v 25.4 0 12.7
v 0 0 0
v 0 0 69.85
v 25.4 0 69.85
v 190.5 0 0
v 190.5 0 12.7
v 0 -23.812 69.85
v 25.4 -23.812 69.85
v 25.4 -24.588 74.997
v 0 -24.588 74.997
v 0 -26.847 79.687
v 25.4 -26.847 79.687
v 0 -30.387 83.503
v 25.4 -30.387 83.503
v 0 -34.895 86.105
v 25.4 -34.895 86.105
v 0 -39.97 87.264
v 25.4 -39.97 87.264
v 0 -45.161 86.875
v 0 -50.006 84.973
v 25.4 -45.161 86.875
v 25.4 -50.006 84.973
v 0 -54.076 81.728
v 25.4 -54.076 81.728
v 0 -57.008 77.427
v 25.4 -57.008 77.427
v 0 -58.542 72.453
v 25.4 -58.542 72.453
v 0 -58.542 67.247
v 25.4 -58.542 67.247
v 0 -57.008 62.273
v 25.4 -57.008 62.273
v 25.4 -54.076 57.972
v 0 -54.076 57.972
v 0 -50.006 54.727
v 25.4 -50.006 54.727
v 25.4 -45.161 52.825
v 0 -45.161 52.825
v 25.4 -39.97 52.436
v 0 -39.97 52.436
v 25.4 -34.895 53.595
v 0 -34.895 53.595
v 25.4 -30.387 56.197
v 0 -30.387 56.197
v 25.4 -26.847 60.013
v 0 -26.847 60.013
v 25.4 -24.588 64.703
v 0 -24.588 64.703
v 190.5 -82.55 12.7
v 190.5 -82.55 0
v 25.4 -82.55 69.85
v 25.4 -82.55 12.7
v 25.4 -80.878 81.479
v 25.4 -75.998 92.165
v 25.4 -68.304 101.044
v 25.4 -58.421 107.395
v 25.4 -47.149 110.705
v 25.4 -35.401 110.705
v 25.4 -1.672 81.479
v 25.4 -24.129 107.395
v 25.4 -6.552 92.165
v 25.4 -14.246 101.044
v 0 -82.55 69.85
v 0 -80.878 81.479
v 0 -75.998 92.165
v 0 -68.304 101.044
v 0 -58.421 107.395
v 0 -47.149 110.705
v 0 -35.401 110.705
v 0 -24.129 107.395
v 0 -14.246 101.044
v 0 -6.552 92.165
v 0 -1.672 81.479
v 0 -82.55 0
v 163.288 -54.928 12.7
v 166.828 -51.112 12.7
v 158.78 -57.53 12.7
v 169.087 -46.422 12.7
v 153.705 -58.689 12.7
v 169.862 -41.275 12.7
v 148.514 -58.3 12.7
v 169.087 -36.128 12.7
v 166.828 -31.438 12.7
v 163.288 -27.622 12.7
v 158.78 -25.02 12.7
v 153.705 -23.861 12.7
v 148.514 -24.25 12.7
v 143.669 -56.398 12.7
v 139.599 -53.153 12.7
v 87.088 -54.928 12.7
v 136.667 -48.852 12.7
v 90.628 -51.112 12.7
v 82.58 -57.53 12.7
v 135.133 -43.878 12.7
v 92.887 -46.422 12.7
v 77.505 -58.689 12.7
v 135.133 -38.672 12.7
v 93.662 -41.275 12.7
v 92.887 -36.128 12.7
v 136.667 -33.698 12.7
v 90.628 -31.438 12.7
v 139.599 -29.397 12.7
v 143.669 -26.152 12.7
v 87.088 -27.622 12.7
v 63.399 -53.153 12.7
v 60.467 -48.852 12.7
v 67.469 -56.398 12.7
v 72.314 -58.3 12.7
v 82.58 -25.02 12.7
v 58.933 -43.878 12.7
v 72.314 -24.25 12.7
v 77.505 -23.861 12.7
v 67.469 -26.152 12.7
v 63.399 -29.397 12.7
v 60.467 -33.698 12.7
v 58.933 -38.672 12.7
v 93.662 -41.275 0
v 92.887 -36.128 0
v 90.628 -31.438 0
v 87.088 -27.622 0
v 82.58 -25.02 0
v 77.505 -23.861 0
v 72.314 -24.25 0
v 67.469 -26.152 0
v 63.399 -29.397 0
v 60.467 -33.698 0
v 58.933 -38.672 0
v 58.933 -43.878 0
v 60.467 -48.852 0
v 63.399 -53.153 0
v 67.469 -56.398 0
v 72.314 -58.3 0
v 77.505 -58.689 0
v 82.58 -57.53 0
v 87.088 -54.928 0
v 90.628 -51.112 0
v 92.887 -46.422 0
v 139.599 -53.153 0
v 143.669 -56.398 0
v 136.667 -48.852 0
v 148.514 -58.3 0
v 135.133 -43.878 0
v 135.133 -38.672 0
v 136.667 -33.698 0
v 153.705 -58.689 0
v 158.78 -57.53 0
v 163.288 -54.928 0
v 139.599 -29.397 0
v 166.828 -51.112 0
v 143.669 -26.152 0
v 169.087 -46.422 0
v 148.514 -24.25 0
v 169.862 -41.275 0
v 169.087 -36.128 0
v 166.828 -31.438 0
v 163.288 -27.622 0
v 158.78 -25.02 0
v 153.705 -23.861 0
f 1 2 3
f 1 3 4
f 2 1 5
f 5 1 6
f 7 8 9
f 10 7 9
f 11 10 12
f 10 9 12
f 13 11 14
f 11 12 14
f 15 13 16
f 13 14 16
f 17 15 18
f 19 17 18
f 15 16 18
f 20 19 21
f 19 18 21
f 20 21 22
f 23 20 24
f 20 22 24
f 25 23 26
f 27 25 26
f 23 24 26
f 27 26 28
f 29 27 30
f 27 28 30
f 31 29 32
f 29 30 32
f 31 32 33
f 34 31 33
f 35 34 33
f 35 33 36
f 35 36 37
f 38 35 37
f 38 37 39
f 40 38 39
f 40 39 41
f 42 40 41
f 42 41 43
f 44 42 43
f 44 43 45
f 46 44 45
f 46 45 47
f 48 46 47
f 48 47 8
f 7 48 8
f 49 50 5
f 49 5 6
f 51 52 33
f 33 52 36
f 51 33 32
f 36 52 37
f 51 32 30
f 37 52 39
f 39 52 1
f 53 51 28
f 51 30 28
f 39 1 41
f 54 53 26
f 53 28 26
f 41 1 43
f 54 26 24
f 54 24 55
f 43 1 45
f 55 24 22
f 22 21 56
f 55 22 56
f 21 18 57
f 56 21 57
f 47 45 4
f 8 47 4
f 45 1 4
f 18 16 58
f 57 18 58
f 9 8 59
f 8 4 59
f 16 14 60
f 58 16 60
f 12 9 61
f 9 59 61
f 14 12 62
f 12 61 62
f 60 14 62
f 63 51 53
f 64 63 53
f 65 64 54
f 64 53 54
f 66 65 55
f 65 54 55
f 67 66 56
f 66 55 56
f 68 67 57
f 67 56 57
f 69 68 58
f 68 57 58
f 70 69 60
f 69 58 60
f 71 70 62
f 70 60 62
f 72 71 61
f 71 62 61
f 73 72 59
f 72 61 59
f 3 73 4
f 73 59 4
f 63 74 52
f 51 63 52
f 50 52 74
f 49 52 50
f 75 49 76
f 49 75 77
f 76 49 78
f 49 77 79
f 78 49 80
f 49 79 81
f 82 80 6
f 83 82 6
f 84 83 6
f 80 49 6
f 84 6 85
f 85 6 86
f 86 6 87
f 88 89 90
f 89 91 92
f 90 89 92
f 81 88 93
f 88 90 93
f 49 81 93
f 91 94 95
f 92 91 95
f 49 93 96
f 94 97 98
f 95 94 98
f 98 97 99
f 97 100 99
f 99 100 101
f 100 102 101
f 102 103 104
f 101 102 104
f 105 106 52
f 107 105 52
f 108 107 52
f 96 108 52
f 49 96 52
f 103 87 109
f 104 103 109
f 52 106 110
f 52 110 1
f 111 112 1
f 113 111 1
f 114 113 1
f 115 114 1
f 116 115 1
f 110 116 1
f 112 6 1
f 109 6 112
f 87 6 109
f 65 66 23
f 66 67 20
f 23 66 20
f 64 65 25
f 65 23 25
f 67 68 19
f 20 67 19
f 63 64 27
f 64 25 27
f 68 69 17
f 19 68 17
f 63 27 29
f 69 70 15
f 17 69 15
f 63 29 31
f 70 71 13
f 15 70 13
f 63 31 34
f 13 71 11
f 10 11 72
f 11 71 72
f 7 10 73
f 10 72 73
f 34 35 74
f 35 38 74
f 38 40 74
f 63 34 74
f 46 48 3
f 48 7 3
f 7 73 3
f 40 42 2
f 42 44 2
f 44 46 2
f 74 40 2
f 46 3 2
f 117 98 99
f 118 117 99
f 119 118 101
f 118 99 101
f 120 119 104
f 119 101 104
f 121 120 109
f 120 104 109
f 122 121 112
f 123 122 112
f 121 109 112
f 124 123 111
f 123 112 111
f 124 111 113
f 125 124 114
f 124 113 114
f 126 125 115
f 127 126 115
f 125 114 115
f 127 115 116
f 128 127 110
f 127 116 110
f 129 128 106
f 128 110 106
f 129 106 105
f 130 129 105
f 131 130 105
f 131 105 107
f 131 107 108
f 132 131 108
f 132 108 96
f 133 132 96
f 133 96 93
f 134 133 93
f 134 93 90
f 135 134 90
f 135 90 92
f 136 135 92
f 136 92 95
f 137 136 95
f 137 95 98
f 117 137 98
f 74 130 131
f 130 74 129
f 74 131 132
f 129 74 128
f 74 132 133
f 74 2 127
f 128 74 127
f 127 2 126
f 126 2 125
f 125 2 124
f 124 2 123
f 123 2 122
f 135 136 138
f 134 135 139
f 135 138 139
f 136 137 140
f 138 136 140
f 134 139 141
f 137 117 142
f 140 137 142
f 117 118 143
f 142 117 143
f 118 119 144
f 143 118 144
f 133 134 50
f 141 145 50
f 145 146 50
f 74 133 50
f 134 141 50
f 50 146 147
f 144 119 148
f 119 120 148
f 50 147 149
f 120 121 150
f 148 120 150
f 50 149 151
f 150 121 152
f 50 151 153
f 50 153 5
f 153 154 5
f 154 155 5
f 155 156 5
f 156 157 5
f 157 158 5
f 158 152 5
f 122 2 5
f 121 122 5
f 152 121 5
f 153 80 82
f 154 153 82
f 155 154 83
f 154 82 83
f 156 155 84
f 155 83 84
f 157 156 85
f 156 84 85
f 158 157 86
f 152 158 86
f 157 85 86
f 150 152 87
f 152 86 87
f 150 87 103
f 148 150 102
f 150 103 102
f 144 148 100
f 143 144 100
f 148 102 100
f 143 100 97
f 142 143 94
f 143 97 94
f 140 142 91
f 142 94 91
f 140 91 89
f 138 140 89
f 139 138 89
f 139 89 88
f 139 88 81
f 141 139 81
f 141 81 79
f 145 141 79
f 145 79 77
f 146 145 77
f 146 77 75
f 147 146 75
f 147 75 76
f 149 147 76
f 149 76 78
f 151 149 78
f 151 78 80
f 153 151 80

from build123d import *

# Parameters (mm, degrees)
F1_DEPTH = 82.55
F2_R     = 17.4625
F3_DEPTH = 25.401
F4_R     = 17.4625
F5_DEPTH = 12.701


with BuildPart() as f1:
    # F0 (on Front) → F1 (new body)
    with BuildSketch(Plane.XZ):
        Polygon((0, 127), (0, 0), (190.5, 0), (190.5, 12.7), (25.4, 12.7), (25.4, 127), align=None)
    extrude(amount=F1_DEPTH)

    # F2 (on face) → F3 (cut, through all)
    with BuildSketch(Plane.YZ.offset(25.4)):
        with Locations((-41.275, 69.85)):
            Circle(F2_R)
        with BuildLine():
            ThreePointArc((-82.55, 69.85), (-41.275, 111.125), (0, 69.85))
            Line((0, 69.85), (0, 127))
            Line((0, 127), (-82.55, 127))
            Line((-82.55, 127), (-82.55, 69.85))
        make_face()
    extrude(amount=-F3_DEPTH, mode=Mode.SUBTRACT)

    # F4 (on face) → F5 (cut, through all)
    with BuildSketch(Plane.XY.offset(12.7)):
        with Locations((152.4, -41.275)):
            Circle(F4_R)
        with Locations((76.2, -41.275)):
            Circle(F4_R)
    extrude(amount=-F5_DEPTH, mode=Mode.SUBTRACT)


solid = f1.part
